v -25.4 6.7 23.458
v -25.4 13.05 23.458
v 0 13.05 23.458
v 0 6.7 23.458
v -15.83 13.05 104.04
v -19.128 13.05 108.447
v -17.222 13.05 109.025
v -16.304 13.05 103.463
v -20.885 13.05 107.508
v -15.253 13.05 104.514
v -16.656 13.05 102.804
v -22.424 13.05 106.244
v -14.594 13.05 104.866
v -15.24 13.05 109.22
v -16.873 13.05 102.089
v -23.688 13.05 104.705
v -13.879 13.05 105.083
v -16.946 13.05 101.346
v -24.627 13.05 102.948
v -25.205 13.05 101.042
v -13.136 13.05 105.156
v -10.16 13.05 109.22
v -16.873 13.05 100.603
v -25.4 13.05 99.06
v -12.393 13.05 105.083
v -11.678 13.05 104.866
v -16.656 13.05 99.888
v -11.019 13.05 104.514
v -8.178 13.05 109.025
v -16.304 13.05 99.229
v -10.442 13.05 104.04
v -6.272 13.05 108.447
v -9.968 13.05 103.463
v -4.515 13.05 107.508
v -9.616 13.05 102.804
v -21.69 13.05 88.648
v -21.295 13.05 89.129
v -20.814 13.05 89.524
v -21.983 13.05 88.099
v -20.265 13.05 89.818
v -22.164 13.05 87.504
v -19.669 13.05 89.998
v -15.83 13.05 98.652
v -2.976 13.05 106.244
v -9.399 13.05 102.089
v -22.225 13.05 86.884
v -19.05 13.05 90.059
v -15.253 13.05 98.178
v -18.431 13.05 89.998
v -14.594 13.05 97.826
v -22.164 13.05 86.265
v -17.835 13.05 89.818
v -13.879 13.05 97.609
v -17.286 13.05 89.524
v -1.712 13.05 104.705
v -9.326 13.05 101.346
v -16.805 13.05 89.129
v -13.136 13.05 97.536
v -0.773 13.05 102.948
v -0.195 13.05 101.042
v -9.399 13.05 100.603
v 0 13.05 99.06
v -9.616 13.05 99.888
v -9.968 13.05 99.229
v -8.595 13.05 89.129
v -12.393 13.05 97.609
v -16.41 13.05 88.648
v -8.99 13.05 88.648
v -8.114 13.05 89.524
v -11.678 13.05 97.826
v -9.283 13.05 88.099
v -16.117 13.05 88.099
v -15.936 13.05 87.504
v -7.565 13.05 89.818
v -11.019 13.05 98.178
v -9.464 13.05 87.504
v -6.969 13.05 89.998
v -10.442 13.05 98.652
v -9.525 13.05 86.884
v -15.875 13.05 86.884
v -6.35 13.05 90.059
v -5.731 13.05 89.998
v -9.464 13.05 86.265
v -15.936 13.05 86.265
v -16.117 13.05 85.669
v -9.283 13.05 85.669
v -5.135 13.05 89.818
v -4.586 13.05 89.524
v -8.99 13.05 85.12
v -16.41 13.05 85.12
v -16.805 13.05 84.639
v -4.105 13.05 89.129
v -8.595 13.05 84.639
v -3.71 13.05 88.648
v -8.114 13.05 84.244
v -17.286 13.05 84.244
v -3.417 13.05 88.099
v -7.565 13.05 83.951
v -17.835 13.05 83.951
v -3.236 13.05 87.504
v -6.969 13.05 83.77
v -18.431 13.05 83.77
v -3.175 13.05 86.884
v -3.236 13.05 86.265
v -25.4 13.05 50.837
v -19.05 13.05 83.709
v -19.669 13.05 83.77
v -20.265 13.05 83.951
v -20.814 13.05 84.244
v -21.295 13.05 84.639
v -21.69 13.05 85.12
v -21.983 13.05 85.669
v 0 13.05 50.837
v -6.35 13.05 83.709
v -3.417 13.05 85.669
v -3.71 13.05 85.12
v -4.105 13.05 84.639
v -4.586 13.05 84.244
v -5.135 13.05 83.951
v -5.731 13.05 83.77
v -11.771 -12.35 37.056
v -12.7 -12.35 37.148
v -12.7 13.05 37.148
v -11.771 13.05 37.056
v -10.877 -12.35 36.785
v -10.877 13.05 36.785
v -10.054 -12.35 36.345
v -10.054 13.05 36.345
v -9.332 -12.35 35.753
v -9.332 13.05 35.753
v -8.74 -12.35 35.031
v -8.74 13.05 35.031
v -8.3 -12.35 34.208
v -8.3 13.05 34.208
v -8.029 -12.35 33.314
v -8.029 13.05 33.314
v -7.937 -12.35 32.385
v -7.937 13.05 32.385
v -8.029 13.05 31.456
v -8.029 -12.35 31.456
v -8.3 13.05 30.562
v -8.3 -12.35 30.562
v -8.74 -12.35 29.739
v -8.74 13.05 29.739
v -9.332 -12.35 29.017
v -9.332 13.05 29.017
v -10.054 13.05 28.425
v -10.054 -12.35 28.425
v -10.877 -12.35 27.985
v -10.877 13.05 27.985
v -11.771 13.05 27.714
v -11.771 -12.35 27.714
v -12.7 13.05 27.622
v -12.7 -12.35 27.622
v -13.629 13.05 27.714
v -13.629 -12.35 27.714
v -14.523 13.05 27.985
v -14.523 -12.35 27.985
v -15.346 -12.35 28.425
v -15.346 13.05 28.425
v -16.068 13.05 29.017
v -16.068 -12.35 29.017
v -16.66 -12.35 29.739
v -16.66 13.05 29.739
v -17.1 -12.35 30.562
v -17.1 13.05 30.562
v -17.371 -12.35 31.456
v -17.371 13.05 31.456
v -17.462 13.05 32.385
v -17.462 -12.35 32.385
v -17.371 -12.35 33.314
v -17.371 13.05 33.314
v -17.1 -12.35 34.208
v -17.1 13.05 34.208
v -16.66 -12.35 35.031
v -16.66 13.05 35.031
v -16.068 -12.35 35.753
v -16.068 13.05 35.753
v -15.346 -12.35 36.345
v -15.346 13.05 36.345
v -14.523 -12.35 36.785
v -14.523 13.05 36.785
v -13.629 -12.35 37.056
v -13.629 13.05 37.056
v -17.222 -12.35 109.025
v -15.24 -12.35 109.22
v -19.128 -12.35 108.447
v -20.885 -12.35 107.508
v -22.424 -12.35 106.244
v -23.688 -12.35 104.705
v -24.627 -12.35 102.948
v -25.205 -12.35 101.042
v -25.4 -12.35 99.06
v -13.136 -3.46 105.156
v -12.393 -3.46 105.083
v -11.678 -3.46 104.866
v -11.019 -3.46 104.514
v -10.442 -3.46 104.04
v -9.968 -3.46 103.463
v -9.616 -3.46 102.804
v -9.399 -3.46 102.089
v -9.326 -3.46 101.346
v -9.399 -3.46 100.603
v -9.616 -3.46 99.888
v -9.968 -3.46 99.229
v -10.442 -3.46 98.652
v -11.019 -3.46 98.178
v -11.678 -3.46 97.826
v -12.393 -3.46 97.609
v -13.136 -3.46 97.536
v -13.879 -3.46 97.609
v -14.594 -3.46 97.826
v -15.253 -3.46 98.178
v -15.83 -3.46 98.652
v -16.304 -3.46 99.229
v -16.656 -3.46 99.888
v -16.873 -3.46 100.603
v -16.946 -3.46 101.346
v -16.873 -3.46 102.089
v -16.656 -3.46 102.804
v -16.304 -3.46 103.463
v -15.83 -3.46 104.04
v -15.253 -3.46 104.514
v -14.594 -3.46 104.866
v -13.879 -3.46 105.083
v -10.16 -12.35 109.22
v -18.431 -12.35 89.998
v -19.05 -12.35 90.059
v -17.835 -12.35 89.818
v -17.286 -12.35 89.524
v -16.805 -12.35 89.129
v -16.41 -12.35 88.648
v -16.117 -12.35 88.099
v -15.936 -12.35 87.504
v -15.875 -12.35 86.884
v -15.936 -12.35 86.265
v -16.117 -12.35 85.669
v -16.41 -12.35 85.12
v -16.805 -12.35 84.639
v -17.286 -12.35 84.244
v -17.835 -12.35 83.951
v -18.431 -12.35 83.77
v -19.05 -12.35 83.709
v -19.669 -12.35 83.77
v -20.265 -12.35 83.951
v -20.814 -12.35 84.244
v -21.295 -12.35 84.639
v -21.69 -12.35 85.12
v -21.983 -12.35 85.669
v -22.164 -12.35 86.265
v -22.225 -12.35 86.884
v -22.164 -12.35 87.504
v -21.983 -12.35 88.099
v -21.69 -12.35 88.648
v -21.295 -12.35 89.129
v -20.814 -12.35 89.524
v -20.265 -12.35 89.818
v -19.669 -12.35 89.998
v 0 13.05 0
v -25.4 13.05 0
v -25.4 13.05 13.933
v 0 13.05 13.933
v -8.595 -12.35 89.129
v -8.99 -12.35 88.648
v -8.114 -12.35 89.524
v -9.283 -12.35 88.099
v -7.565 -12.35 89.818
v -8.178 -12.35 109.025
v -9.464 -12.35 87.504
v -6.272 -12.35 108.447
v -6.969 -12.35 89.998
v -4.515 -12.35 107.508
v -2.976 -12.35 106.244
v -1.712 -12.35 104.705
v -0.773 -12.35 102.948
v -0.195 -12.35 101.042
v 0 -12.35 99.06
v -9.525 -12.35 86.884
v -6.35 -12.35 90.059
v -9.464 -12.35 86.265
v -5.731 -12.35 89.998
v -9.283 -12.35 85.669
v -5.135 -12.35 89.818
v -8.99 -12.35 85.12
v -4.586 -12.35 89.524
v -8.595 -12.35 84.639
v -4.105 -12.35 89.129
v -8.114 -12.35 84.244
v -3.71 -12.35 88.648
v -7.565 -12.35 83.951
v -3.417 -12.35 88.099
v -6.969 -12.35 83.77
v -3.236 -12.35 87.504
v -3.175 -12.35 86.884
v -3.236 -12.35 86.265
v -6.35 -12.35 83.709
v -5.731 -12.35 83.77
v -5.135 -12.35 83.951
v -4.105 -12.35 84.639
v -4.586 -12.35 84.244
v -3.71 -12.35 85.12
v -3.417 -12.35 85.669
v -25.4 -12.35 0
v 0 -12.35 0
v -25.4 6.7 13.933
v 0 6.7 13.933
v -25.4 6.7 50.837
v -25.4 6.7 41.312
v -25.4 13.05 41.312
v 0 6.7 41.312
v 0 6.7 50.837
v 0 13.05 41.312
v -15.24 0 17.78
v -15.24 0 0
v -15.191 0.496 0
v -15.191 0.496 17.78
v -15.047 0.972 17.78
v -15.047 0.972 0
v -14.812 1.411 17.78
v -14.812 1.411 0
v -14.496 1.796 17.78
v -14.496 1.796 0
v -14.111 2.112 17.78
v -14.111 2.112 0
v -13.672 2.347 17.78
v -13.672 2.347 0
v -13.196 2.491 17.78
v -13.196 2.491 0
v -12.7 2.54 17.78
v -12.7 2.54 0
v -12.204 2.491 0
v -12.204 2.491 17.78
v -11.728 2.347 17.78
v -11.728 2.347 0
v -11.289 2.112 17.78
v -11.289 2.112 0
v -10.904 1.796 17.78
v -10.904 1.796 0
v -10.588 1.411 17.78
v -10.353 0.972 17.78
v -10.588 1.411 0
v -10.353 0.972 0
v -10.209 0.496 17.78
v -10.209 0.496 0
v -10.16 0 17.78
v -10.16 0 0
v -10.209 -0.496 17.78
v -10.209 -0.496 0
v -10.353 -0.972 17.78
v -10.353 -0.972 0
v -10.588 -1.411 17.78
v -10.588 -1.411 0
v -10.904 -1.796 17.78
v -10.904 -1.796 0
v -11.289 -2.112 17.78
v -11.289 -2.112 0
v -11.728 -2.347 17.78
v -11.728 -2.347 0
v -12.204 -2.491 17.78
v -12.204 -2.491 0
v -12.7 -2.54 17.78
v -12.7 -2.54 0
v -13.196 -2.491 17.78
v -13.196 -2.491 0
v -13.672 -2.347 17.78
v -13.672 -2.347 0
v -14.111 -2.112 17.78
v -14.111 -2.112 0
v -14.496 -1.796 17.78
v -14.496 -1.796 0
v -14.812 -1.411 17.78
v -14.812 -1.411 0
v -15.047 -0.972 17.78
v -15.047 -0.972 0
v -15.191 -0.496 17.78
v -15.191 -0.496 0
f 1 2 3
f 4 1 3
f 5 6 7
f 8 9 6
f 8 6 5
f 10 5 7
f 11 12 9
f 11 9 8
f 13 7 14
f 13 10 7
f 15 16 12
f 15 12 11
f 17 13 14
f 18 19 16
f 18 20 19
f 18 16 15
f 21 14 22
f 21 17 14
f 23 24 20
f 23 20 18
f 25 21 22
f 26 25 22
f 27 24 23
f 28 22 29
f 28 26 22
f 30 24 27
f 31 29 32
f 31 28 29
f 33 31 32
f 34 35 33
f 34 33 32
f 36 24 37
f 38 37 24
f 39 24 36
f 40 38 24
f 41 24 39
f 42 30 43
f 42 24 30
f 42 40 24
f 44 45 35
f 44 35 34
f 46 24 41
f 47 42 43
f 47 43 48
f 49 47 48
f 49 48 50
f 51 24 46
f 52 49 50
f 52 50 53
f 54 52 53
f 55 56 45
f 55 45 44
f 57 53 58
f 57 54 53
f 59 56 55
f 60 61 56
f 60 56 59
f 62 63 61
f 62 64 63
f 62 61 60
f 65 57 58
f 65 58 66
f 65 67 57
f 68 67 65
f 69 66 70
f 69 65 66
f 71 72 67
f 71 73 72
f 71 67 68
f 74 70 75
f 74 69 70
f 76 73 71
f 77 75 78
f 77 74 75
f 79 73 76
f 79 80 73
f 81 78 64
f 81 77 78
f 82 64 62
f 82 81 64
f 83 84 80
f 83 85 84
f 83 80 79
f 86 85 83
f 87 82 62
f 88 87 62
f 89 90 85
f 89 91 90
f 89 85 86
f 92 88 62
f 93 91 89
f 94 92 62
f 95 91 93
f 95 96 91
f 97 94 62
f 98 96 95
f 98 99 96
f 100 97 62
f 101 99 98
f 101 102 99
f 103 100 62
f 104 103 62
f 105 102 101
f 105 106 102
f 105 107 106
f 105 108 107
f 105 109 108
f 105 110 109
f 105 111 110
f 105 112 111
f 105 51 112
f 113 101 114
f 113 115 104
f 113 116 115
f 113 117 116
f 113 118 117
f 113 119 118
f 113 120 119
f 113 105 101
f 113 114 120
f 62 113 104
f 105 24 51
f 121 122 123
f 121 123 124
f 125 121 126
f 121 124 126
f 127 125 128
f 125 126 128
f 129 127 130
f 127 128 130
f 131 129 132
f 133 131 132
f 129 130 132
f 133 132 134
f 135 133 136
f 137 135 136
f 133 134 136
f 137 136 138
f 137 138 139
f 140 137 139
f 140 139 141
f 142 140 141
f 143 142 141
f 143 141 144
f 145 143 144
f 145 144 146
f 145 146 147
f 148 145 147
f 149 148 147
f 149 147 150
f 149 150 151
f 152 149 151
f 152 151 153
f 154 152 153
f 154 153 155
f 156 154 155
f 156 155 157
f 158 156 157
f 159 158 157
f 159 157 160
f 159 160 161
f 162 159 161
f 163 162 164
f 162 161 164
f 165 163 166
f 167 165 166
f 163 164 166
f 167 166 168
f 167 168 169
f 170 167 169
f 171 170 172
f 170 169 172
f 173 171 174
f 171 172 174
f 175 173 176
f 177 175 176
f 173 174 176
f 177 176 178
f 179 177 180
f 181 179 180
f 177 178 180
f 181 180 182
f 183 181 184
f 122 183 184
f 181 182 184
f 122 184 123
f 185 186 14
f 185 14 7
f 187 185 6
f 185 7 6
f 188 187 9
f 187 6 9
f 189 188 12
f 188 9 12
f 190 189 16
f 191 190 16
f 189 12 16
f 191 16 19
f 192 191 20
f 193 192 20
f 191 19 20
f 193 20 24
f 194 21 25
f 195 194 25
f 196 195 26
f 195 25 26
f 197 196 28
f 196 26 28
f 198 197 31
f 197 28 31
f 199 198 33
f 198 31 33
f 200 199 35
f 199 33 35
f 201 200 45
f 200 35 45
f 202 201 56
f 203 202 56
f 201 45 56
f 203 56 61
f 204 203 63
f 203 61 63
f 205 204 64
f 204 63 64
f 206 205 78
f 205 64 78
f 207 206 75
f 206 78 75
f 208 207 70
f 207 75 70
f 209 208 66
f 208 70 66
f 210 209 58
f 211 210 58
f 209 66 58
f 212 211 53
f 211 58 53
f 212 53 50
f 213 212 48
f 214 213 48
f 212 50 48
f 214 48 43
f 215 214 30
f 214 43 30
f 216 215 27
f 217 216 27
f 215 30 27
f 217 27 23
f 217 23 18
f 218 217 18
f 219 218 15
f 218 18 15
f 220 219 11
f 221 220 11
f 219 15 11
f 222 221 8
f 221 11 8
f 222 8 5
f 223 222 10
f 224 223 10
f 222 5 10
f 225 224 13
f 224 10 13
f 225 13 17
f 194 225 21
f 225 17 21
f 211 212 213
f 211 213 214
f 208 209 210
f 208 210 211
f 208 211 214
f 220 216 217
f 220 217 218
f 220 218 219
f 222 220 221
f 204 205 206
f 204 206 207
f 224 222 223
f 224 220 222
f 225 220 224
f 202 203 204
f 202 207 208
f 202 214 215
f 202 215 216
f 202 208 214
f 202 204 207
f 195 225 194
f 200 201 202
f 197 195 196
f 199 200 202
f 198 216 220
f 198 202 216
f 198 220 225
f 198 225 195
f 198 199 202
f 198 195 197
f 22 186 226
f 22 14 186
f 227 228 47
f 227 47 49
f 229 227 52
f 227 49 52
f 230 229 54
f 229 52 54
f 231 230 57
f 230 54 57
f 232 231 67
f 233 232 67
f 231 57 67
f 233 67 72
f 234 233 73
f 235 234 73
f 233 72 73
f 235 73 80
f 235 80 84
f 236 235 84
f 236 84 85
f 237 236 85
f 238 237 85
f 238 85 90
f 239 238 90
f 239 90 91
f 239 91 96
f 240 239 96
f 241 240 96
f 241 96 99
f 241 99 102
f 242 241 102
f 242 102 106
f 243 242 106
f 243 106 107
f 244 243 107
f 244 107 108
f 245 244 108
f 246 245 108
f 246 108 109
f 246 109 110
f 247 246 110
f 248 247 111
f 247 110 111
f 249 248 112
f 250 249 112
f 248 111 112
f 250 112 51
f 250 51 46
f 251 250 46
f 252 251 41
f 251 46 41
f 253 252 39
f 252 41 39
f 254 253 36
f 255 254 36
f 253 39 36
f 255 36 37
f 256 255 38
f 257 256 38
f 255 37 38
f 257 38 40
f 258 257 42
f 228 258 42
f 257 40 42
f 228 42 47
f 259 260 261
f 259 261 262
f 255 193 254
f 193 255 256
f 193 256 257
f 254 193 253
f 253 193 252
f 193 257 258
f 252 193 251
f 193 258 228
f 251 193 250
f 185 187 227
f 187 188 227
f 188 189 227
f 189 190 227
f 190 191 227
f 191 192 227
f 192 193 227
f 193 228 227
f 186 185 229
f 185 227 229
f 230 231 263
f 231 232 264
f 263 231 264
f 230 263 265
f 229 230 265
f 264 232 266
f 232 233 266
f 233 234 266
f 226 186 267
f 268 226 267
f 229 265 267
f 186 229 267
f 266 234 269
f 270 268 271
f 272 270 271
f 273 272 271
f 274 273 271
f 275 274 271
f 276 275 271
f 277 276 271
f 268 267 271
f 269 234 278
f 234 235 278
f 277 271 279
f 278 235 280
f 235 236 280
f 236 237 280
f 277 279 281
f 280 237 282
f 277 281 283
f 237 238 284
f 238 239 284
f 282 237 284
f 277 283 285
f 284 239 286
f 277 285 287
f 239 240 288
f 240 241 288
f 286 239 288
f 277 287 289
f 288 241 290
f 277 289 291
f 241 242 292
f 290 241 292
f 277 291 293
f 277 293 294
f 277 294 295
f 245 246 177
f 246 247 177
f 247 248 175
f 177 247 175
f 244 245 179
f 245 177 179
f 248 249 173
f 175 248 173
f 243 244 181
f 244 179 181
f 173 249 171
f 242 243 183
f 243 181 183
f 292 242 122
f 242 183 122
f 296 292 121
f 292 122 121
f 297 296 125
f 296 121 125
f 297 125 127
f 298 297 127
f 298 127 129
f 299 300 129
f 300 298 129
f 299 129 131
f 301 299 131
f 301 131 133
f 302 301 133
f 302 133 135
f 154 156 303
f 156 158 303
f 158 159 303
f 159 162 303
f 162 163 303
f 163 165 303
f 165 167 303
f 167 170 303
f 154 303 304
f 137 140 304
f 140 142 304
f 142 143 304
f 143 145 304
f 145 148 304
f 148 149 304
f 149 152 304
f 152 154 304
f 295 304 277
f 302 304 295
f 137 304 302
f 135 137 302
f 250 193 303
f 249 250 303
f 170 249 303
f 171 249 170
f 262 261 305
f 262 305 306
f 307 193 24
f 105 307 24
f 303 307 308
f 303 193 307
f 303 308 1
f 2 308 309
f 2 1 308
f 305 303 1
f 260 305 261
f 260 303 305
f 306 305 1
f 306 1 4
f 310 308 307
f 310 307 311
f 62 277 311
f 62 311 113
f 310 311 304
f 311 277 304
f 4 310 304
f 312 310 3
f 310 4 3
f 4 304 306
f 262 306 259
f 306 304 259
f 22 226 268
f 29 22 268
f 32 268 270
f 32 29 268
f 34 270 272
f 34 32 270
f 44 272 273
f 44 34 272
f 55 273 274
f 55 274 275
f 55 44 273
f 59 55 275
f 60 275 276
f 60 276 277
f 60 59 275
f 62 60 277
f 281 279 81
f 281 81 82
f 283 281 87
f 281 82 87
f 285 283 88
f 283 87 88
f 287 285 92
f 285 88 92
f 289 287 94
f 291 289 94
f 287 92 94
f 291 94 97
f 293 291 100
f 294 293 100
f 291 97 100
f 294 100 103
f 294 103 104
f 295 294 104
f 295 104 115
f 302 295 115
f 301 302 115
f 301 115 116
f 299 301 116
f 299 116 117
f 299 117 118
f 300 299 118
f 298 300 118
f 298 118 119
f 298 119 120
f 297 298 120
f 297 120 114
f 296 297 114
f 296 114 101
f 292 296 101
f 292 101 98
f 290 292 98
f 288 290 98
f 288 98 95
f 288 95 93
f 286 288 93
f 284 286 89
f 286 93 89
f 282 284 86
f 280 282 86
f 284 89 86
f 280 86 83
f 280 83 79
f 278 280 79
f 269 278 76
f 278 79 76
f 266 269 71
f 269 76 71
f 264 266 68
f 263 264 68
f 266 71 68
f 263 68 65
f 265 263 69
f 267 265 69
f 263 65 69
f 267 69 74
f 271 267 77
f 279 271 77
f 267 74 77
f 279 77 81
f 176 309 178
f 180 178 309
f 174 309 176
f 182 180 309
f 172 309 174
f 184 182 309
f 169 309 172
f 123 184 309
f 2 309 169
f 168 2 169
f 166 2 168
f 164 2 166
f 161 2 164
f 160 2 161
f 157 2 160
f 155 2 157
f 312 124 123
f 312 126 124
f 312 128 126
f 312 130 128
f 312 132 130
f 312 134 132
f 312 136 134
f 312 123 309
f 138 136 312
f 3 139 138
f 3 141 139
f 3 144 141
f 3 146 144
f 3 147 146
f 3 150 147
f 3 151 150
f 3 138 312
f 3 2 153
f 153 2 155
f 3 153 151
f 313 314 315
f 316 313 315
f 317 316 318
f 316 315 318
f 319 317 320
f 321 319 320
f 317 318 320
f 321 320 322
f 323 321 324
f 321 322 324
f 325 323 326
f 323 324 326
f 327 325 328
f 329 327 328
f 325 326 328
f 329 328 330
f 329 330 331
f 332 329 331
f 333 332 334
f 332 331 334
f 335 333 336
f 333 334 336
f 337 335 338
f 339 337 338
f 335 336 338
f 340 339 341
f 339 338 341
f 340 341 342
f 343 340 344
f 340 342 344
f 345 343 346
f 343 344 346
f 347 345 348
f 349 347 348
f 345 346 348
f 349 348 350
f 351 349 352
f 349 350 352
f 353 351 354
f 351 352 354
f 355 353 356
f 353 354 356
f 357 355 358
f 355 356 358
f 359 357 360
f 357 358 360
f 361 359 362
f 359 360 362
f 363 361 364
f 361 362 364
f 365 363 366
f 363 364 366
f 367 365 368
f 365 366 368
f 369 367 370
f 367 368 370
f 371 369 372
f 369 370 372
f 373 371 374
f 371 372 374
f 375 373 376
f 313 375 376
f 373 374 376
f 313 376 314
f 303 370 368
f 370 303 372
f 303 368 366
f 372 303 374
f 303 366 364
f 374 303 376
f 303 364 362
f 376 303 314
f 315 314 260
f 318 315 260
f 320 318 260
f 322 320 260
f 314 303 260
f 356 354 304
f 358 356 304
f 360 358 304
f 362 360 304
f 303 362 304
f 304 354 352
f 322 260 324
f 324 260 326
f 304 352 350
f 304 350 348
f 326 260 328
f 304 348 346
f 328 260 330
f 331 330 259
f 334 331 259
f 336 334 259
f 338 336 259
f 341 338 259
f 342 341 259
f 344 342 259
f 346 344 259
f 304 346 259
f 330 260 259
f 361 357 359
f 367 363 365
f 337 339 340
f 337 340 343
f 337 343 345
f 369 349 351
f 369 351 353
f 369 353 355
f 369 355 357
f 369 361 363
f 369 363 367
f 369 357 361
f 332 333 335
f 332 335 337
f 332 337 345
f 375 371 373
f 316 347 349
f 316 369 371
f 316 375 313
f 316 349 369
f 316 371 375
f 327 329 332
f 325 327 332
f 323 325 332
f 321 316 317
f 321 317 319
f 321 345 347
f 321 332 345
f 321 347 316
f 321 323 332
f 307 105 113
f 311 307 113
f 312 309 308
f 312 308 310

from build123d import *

# Parameters (mm, degrees)
SKETCH1_W           = 25.4
SKETCH1_H           = 25.4
BOSS_EXTRUDE1_DEPTH = 109.22
SKETCH2_R           = 2.54
CUT_EXTRUDE1_DEPTH  = 17.78
SKETCH3_R           = 4.7625
CUT_EXTRUDE2_DEPTH  = 115.975338225
SKETCH7_W           = 25.4
SKETCH7_H           = 9.525
CUT_EXTRUDE5_DEPTH  = 6.35
SKETCH9_R           = 3.175
CUT_EXTRUDE7_DEPTH  = 115.975338225
SKETCH10_R          = 3.81
CUT_EXTRUDE8_DEPTH  = 16.51
FILLET1_R           = 10.16
FILLET2_R           = 10.16


with BuildPart() as part:
    # Sketch1 → Boss-Extrude1 (new body)
    with BuildSketch(Plane.XY):
        with Locations((-12.7, 0.350344828)):
            Rectangle(SKETCH1_W, SKETCH1_H)
    extrude(amount=BOSS_EXTRUDE1_DEPTH)

    # Sketch2 → Cut-Extrude1 (cut)
    with BuildSketch(Plane(origin=(0, 0, 0), x_dir=(-1, 0, 0), z_dir=(0, 0, -1))):
        with Locations((12.7, 0)):
            Circle(SKETCH2_R)
    extrude(amount=-CUT_EXTRUDE1_DEPTH, mode=Mode.SUBTRACT)

    # Sketch3 → Cut-Extrude2 (cut, through all)
    with BuildSketch(Plane(origin=(0, 13.050344828, 0), x_dir=(1, 0, 0), z_dir=(0, 1, 0))):
        with Locations(Location((-12.7, -32.385, 0), (0, 0, 270))):
            Circle(SKETCH3_R)
    extrude(amount=-CUT_EXTRUDE2_DEPTH, mode=Mode.SUBTRACT)

    # Sketch7 → Cut-Extrude5 (cut)
    with BuildSketch(Plane(origin=(0, 13.050344828, 0), x_dir=(1, 0, 0), z_dir=(0, 1, 0))):
        with Locations((-12.7, -18.695040466)):
            Rectangle(SKETCH7_W, SKETCH7_H)
        with Locations((-12.7, -46.074959534)):
            Rectangle(SKETCH7_W, SKETCH7_H)
    extrude(amount=-CUT_EXTRUDE5_DEPTH, mode=Mode.SUBTRACT)

    # Sketch9 → Cut-Extrude7 (cut, through all)
    with BuildSketch(Plane(origin=(0, 13.050344828, 0), x_dir=(1, 0, 0), z_dir=(0, 1, 0))):
        with Locations(Location((-19.05, -86.884321607, 0), (0, 0, 270))):
            Circle(SKETCH9_R)
        with Locations(Location((-6.35, -86.884321607, 0), (0, 0, 270))):
            Circle(SKETCH9_R)
    extrude(amount=-CUT_EXTRUDE7_DEPTH, mode=Mode.SUBTRACT)

    # Sketch10 → Cut-Extrude8 (cut)
    with BuildSketch(Plane(origin=(0, 13.050344828, 0), x_dir=(1, 0, 0), z_dir=(0, 1, 0))):
        with Locations(Location((-13.13594772, -101.346, 0), (0, 0, 270))):
            Circle(SKETCH10_R)
    extrude(amount=-CUT_EXTRUDE8_DEPTH, mode=Mode.SUBTRACT)

    # Fillet1
    fillet1_edges = [part.edges().sort_by_distance(p)[0] for p in [
        (0, 0.350344828, 109.22),
    ]]
    fillet(fillet1_edges, radius=FILLET1_R)

    # Fillet2
    fillet2_edges = [part.edges().sort_by_distance(p)[0] for p in [
        (-25.4, 0.350344828, 109.22),
    ]]
    fillet(fillet2_edges, radius=FILLET2_R)


solid = part.part
